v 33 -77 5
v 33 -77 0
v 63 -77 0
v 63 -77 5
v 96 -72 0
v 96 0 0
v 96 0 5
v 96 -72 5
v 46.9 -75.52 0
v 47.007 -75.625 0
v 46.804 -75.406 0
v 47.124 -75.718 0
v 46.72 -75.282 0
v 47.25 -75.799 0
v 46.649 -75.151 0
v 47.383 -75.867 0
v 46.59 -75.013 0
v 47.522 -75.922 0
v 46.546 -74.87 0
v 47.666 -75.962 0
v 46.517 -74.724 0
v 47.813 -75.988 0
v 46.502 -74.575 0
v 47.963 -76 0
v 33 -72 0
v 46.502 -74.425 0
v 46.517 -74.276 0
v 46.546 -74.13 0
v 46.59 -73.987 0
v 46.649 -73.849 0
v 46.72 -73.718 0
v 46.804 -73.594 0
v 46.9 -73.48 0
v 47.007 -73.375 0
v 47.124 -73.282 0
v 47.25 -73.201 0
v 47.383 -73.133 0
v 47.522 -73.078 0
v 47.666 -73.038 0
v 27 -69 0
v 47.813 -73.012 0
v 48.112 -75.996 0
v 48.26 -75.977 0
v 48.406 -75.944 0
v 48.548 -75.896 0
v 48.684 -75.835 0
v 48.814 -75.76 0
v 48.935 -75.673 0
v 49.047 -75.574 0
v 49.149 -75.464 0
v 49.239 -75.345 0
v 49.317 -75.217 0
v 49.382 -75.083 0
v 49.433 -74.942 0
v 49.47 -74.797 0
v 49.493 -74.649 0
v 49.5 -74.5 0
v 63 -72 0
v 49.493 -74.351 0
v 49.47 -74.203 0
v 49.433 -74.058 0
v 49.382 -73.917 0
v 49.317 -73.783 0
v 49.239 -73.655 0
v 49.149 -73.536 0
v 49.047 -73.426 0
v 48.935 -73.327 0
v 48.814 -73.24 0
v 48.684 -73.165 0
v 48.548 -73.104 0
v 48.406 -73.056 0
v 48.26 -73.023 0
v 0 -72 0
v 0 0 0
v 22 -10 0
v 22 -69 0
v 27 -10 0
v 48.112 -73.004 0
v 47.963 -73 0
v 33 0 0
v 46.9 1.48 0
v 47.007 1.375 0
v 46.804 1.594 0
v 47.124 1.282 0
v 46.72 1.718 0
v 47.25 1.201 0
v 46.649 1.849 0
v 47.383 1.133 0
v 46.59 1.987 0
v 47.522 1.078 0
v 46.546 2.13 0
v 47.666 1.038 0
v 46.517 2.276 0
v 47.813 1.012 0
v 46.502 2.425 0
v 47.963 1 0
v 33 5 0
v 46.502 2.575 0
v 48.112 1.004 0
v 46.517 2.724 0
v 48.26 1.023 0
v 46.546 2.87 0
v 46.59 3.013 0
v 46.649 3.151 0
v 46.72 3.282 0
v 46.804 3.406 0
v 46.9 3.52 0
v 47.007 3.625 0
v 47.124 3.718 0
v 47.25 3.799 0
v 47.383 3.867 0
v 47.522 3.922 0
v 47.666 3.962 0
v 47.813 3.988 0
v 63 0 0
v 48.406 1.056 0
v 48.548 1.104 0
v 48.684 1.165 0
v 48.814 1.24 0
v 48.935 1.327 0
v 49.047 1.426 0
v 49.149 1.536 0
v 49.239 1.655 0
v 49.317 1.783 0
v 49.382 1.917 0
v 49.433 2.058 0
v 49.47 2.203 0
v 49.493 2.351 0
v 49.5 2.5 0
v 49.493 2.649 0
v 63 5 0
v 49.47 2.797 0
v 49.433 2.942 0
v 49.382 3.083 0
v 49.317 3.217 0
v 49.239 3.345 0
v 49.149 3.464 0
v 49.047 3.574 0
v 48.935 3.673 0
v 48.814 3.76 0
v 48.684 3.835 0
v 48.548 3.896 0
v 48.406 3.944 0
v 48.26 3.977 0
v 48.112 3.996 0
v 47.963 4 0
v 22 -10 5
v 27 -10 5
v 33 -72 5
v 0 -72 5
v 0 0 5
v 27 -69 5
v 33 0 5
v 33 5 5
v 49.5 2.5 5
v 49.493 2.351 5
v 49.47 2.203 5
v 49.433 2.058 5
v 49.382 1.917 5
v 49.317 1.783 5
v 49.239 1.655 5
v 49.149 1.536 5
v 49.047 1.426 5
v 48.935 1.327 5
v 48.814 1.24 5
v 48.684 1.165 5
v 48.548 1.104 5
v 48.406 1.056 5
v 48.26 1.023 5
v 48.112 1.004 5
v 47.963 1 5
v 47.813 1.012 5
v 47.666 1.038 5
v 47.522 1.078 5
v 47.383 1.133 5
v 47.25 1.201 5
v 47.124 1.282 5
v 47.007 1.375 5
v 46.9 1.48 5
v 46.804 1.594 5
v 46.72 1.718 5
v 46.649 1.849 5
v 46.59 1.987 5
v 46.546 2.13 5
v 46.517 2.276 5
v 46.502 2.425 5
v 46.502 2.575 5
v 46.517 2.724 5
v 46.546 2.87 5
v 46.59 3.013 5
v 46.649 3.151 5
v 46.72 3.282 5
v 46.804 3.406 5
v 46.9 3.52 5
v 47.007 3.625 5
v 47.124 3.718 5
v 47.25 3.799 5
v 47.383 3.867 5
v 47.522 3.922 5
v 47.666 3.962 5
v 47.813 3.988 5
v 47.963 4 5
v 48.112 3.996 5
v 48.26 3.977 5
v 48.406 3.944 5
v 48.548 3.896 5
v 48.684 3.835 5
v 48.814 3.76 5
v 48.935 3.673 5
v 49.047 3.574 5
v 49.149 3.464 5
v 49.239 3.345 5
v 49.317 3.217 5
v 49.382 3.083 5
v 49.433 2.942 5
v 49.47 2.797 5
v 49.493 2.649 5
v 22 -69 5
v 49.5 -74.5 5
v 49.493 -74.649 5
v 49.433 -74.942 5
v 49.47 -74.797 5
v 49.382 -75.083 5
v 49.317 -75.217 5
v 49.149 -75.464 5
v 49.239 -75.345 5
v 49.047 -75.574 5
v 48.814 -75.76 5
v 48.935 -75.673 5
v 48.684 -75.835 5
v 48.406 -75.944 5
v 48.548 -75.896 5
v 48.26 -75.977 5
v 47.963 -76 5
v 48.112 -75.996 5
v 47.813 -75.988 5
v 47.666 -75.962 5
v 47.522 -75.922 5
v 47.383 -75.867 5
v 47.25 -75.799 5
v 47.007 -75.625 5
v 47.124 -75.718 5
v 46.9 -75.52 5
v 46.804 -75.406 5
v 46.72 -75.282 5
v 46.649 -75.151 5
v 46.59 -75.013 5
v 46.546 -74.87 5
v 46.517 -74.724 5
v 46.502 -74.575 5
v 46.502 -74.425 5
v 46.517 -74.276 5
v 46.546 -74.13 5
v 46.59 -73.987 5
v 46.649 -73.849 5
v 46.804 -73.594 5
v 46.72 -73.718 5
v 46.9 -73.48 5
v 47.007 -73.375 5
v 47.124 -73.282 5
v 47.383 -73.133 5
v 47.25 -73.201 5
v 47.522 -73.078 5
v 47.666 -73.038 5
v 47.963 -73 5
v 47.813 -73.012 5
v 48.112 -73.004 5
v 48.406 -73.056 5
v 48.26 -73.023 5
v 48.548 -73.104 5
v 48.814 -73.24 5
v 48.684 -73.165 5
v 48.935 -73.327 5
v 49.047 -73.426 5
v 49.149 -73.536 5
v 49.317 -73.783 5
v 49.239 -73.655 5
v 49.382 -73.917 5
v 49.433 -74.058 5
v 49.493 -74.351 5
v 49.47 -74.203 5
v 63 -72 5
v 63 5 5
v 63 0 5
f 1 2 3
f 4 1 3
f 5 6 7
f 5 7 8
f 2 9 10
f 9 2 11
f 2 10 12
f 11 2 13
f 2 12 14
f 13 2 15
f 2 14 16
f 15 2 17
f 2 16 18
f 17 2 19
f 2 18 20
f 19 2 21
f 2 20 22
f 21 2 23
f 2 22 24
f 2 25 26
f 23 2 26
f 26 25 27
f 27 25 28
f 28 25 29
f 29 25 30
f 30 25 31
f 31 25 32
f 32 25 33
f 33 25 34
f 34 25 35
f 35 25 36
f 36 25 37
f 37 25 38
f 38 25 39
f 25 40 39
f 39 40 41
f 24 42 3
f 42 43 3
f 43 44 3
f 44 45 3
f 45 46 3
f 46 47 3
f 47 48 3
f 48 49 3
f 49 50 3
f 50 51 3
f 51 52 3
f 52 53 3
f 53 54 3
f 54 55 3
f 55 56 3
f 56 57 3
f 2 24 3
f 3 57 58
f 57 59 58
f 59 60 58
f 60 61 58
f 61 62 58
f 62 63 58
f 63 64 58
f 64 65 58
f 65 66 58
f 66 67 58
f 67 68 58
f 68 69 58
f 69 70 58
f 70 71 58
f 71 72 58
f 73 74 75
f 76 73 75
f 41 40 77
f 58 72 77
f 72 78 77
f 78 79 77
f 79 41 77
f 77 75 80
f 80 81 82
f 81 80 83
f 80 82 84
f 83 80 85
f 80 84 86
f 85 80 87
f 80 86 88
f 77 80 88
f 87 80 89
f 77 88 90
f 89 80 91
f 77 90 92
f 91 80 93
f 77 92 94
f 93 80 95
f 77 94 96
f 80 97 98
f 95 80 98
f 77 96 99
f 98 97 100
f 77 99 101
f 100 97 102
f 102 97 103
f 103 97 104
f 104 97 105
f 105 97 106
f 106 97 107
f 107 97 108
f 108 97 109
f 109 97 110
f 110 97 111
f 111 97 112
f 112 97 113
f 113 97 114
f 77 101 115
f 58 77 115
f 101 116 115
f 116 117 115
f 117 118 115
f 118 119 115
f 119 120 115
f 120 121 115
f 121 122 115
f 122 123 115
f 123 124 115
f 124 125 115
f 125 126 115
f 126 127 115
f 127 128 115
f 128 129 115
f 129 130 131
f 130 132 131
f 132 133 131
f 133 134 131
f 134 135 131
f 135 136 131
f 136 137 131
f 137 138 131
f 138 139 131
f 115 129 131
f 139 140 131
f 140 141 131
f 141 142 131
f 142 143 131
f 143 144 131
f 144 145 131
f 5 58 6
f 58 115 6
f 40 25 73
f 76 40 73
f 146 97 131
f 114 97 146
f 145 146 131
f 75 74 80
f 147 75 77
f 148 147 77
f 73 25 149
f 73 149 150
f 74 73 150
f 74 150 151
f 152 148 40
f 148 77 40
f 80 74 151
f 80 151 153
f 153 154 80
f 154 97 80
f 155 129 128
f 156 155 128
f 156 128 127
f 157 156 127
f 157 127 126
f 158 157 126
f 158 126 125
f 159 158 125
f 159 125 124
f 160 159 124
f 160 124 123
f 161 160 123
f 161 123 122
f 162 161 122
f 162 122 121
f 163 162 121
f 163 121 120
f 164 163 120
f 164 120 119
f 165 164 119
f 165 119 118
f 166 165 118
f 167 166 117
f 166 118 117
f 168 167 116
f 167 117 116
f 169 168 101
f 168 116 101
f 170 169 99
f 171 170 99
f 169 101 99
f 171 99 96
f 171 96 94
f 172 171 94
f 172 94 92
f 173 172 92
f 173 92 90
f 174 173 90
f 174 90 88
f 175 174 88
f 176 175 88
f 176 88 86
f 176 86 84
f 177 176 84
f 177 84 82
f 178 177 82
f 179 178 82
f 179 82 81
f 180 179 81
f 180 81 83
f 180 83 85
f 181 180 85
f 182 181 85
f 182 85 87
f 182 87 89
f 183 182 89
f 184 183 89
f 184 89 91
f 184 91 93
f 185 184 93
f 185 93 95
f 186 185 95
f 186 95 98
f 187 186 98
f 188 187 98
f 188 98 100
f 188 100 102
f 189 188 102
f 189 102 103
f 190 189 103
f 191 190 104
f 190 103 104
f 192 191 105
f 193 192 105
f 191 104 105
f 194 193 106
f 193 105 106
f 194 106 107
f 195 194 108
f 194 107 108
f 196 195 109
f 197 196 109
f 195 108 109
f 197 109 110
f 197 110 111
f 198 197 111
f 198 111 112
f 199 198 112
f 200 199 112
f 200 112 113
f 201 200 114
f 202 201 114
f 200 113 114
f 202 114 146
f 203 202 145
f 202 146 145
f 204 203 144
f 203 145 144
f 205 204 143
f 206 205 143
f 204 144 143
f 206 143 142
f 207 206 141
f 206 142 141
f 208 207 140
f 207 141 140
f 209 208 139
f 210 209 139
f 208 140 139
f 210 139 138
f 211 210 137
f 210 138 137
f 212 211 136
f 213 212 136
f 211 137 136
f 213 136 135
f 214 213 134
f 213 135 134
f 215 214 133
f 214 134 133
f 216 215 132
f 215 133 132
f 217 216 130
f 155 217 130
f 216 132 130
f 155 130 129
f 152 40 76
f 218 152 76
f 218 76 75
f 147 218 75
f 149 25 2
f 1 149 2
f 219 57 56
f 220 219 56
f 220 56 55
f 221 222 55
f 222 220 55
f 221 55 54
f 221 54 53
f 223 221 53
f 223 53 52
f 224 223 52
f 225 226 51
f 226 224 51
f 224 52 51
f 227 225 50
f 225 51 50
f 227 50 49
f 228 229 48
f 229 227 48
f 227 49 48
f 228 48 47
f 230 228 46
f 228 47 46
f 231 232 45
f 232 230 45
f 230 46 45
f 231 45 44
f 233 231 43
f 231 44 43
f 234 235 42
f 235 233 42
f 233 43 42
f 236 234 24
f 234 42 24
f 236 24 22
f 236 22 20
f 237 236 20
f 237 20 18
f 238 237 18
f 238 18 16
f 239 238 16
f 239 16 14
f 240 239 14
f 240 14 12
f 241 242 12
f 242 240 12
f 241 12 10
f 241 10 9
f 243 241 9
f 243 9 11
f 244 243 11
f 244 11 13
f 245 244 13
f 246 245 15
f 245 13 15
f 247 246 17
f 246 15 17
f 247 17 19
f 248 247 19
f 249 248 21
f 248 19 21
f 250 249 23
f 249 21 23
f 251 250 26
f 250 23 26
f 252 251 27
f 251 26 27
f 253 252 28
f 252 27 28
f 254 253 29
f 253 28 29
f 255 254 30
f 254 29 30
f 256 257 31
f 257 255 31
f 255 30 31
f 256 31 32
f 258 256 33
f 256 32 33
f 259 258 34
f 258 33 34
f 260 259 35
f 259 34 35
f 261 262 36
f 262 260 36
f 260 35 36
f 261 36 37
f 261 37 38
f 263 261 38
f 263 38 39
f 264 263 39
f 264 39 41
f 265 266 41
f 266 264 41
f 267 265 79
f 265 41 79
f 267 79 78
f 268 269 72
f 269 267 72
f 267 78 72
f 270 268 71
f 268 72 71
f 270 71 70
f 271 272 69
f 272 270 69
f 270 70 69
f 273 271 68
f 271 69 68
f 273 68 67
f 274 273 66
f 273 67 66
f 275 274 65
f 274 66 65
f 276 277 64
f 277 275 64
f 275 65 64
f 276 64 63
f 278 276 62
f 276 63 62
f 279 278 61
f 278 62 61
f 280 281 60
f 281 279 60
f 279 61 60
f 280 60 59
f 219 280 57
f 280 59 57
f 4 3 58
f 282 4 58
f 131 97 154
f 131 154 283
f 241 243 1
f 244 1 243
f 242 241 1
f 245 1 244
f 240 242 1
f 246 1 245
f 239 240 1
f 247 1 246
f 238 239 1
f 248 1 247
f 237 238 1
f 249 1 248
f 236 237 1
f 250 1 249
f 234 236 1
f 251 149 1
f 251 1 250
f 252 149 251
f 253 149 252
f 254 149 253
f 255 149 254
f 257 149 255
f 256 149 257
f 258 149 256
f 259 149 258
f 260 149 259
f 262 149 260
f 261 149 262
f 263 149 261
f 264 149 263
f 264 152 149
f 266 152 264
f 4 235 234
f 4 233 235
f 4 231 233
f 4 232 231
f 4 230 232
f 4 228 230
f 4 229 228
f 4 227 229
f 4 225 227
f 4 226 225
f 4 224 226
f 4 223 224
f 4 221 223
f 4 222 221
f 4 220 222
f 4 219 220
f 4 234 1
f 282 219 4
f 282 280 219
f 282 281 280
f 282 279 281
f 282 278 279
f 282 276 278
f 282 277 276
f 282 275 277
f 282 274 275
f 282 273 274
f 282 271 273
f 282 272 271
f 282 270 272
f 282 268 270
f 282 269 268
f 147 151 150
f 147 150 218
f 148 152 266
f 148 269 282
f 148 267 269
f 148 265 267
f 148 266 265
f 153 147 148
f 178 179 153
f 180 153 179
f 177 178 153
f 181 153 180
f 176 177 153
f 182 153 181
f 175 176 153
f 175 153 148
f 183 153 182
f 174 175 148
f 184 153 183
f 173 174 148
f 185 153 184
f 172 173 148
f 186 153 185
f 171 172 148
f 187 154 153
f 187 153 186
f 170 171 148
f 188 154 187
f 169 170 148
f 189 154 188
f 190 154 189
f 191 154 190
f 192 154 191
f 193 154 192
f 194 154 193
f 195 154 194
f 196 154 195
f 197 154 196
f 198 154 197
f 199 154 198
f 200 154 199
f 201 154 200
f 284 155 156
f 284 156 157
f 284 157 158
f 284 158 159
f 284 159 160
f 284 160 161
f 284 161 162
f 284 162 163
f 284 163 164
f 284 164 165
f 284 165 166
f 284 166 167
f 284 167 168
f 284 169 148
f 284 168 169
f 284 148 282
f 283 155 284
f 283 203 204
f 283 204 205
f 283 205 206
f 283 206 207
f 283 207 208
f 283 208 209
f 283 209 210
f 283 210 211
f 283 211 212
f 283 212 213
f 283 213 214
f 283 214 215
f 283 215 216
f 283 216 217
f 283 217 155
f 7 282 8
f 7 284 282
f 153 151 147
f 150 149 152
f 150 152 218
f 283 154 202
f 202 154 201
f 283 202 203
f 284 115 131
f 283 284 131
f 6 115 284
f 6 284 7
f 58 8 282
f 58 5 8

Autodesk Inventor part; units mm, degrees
ref_plane "YZ Plane" through (0, 0, 0) normal (1, 0, 0) x (0, 1, 0)
ref_plane "XZ Plane" through (0, 0, 0) normal (0, 1, 0) x (-1, 0, 0)
ref_plane "XY Plane" through (0, 0, 0) normal (0, 0, 1) x (1, 0, 0)
sketch "草图1" plane through (0, 0, 0) normal (0, 0, 1) x (1, 0, 0)
  line L0 (33, 0) -> (46.5, 0) projected
  line L1 (33, 5) -> (46.5, 5) projected
  line L2 (25, -72) -> (33, -72) projected
  line L3 (0, 0) -> (96, 0)
  line L4 (96, 0) -> (96, -72)
  line L5 (96, -72) -> (0, -72)
  line L6 (0, -72) -> (0, 0)
  line L7 (27, -69) -> (22, -69)
  line L8 (22, -69) -> (22, -10)
  line L9 (22, -10) -> (27, -10)
  line L10 (27, -10) -> (27, -69)
  line L11 (48, -81.8349) -> (48, 25.2825) construction
  line L12 (33, 0) -> (63, 0)
  line L13 (63, 0) -> (63, 5)
  line L14 (63, 5) -> (33, 5)
  line L15 (33, 5) -> (33, 0)
  line L16 (33, 0) -> (63, 5) construction
  line L17 (63, 0) -> (33, 5) construction
  line L18 (46, -77) -> (61, -77) projected
  line L19 (63, -72) -> (33, -72)
  line L20 (33, -72) -> (33, -77)
  line L21 (33, -77) -> (63, -77)
  line L22 (63, -77) -> (63, -72)
  circle A0 centre (48, 2.5) radius 1.5
  circle A1 centre (48, -74.5) radius 1.5
  line L23 (33, 5) -> (33, 0) projected
  line L24 (46.5, 0) -> (46.5, 5) projected
  dimension "d0" = 3
  dimension "d1" = 10
  dimension "d2" = 59
  dimension "d3" = 5
  dimension "d4" = 22
  dimension "d6" = 3
  dimension "d7" = 3
extrude "拉伸1" add sketch "草图1" along normal blind 5
properties part number "face"
